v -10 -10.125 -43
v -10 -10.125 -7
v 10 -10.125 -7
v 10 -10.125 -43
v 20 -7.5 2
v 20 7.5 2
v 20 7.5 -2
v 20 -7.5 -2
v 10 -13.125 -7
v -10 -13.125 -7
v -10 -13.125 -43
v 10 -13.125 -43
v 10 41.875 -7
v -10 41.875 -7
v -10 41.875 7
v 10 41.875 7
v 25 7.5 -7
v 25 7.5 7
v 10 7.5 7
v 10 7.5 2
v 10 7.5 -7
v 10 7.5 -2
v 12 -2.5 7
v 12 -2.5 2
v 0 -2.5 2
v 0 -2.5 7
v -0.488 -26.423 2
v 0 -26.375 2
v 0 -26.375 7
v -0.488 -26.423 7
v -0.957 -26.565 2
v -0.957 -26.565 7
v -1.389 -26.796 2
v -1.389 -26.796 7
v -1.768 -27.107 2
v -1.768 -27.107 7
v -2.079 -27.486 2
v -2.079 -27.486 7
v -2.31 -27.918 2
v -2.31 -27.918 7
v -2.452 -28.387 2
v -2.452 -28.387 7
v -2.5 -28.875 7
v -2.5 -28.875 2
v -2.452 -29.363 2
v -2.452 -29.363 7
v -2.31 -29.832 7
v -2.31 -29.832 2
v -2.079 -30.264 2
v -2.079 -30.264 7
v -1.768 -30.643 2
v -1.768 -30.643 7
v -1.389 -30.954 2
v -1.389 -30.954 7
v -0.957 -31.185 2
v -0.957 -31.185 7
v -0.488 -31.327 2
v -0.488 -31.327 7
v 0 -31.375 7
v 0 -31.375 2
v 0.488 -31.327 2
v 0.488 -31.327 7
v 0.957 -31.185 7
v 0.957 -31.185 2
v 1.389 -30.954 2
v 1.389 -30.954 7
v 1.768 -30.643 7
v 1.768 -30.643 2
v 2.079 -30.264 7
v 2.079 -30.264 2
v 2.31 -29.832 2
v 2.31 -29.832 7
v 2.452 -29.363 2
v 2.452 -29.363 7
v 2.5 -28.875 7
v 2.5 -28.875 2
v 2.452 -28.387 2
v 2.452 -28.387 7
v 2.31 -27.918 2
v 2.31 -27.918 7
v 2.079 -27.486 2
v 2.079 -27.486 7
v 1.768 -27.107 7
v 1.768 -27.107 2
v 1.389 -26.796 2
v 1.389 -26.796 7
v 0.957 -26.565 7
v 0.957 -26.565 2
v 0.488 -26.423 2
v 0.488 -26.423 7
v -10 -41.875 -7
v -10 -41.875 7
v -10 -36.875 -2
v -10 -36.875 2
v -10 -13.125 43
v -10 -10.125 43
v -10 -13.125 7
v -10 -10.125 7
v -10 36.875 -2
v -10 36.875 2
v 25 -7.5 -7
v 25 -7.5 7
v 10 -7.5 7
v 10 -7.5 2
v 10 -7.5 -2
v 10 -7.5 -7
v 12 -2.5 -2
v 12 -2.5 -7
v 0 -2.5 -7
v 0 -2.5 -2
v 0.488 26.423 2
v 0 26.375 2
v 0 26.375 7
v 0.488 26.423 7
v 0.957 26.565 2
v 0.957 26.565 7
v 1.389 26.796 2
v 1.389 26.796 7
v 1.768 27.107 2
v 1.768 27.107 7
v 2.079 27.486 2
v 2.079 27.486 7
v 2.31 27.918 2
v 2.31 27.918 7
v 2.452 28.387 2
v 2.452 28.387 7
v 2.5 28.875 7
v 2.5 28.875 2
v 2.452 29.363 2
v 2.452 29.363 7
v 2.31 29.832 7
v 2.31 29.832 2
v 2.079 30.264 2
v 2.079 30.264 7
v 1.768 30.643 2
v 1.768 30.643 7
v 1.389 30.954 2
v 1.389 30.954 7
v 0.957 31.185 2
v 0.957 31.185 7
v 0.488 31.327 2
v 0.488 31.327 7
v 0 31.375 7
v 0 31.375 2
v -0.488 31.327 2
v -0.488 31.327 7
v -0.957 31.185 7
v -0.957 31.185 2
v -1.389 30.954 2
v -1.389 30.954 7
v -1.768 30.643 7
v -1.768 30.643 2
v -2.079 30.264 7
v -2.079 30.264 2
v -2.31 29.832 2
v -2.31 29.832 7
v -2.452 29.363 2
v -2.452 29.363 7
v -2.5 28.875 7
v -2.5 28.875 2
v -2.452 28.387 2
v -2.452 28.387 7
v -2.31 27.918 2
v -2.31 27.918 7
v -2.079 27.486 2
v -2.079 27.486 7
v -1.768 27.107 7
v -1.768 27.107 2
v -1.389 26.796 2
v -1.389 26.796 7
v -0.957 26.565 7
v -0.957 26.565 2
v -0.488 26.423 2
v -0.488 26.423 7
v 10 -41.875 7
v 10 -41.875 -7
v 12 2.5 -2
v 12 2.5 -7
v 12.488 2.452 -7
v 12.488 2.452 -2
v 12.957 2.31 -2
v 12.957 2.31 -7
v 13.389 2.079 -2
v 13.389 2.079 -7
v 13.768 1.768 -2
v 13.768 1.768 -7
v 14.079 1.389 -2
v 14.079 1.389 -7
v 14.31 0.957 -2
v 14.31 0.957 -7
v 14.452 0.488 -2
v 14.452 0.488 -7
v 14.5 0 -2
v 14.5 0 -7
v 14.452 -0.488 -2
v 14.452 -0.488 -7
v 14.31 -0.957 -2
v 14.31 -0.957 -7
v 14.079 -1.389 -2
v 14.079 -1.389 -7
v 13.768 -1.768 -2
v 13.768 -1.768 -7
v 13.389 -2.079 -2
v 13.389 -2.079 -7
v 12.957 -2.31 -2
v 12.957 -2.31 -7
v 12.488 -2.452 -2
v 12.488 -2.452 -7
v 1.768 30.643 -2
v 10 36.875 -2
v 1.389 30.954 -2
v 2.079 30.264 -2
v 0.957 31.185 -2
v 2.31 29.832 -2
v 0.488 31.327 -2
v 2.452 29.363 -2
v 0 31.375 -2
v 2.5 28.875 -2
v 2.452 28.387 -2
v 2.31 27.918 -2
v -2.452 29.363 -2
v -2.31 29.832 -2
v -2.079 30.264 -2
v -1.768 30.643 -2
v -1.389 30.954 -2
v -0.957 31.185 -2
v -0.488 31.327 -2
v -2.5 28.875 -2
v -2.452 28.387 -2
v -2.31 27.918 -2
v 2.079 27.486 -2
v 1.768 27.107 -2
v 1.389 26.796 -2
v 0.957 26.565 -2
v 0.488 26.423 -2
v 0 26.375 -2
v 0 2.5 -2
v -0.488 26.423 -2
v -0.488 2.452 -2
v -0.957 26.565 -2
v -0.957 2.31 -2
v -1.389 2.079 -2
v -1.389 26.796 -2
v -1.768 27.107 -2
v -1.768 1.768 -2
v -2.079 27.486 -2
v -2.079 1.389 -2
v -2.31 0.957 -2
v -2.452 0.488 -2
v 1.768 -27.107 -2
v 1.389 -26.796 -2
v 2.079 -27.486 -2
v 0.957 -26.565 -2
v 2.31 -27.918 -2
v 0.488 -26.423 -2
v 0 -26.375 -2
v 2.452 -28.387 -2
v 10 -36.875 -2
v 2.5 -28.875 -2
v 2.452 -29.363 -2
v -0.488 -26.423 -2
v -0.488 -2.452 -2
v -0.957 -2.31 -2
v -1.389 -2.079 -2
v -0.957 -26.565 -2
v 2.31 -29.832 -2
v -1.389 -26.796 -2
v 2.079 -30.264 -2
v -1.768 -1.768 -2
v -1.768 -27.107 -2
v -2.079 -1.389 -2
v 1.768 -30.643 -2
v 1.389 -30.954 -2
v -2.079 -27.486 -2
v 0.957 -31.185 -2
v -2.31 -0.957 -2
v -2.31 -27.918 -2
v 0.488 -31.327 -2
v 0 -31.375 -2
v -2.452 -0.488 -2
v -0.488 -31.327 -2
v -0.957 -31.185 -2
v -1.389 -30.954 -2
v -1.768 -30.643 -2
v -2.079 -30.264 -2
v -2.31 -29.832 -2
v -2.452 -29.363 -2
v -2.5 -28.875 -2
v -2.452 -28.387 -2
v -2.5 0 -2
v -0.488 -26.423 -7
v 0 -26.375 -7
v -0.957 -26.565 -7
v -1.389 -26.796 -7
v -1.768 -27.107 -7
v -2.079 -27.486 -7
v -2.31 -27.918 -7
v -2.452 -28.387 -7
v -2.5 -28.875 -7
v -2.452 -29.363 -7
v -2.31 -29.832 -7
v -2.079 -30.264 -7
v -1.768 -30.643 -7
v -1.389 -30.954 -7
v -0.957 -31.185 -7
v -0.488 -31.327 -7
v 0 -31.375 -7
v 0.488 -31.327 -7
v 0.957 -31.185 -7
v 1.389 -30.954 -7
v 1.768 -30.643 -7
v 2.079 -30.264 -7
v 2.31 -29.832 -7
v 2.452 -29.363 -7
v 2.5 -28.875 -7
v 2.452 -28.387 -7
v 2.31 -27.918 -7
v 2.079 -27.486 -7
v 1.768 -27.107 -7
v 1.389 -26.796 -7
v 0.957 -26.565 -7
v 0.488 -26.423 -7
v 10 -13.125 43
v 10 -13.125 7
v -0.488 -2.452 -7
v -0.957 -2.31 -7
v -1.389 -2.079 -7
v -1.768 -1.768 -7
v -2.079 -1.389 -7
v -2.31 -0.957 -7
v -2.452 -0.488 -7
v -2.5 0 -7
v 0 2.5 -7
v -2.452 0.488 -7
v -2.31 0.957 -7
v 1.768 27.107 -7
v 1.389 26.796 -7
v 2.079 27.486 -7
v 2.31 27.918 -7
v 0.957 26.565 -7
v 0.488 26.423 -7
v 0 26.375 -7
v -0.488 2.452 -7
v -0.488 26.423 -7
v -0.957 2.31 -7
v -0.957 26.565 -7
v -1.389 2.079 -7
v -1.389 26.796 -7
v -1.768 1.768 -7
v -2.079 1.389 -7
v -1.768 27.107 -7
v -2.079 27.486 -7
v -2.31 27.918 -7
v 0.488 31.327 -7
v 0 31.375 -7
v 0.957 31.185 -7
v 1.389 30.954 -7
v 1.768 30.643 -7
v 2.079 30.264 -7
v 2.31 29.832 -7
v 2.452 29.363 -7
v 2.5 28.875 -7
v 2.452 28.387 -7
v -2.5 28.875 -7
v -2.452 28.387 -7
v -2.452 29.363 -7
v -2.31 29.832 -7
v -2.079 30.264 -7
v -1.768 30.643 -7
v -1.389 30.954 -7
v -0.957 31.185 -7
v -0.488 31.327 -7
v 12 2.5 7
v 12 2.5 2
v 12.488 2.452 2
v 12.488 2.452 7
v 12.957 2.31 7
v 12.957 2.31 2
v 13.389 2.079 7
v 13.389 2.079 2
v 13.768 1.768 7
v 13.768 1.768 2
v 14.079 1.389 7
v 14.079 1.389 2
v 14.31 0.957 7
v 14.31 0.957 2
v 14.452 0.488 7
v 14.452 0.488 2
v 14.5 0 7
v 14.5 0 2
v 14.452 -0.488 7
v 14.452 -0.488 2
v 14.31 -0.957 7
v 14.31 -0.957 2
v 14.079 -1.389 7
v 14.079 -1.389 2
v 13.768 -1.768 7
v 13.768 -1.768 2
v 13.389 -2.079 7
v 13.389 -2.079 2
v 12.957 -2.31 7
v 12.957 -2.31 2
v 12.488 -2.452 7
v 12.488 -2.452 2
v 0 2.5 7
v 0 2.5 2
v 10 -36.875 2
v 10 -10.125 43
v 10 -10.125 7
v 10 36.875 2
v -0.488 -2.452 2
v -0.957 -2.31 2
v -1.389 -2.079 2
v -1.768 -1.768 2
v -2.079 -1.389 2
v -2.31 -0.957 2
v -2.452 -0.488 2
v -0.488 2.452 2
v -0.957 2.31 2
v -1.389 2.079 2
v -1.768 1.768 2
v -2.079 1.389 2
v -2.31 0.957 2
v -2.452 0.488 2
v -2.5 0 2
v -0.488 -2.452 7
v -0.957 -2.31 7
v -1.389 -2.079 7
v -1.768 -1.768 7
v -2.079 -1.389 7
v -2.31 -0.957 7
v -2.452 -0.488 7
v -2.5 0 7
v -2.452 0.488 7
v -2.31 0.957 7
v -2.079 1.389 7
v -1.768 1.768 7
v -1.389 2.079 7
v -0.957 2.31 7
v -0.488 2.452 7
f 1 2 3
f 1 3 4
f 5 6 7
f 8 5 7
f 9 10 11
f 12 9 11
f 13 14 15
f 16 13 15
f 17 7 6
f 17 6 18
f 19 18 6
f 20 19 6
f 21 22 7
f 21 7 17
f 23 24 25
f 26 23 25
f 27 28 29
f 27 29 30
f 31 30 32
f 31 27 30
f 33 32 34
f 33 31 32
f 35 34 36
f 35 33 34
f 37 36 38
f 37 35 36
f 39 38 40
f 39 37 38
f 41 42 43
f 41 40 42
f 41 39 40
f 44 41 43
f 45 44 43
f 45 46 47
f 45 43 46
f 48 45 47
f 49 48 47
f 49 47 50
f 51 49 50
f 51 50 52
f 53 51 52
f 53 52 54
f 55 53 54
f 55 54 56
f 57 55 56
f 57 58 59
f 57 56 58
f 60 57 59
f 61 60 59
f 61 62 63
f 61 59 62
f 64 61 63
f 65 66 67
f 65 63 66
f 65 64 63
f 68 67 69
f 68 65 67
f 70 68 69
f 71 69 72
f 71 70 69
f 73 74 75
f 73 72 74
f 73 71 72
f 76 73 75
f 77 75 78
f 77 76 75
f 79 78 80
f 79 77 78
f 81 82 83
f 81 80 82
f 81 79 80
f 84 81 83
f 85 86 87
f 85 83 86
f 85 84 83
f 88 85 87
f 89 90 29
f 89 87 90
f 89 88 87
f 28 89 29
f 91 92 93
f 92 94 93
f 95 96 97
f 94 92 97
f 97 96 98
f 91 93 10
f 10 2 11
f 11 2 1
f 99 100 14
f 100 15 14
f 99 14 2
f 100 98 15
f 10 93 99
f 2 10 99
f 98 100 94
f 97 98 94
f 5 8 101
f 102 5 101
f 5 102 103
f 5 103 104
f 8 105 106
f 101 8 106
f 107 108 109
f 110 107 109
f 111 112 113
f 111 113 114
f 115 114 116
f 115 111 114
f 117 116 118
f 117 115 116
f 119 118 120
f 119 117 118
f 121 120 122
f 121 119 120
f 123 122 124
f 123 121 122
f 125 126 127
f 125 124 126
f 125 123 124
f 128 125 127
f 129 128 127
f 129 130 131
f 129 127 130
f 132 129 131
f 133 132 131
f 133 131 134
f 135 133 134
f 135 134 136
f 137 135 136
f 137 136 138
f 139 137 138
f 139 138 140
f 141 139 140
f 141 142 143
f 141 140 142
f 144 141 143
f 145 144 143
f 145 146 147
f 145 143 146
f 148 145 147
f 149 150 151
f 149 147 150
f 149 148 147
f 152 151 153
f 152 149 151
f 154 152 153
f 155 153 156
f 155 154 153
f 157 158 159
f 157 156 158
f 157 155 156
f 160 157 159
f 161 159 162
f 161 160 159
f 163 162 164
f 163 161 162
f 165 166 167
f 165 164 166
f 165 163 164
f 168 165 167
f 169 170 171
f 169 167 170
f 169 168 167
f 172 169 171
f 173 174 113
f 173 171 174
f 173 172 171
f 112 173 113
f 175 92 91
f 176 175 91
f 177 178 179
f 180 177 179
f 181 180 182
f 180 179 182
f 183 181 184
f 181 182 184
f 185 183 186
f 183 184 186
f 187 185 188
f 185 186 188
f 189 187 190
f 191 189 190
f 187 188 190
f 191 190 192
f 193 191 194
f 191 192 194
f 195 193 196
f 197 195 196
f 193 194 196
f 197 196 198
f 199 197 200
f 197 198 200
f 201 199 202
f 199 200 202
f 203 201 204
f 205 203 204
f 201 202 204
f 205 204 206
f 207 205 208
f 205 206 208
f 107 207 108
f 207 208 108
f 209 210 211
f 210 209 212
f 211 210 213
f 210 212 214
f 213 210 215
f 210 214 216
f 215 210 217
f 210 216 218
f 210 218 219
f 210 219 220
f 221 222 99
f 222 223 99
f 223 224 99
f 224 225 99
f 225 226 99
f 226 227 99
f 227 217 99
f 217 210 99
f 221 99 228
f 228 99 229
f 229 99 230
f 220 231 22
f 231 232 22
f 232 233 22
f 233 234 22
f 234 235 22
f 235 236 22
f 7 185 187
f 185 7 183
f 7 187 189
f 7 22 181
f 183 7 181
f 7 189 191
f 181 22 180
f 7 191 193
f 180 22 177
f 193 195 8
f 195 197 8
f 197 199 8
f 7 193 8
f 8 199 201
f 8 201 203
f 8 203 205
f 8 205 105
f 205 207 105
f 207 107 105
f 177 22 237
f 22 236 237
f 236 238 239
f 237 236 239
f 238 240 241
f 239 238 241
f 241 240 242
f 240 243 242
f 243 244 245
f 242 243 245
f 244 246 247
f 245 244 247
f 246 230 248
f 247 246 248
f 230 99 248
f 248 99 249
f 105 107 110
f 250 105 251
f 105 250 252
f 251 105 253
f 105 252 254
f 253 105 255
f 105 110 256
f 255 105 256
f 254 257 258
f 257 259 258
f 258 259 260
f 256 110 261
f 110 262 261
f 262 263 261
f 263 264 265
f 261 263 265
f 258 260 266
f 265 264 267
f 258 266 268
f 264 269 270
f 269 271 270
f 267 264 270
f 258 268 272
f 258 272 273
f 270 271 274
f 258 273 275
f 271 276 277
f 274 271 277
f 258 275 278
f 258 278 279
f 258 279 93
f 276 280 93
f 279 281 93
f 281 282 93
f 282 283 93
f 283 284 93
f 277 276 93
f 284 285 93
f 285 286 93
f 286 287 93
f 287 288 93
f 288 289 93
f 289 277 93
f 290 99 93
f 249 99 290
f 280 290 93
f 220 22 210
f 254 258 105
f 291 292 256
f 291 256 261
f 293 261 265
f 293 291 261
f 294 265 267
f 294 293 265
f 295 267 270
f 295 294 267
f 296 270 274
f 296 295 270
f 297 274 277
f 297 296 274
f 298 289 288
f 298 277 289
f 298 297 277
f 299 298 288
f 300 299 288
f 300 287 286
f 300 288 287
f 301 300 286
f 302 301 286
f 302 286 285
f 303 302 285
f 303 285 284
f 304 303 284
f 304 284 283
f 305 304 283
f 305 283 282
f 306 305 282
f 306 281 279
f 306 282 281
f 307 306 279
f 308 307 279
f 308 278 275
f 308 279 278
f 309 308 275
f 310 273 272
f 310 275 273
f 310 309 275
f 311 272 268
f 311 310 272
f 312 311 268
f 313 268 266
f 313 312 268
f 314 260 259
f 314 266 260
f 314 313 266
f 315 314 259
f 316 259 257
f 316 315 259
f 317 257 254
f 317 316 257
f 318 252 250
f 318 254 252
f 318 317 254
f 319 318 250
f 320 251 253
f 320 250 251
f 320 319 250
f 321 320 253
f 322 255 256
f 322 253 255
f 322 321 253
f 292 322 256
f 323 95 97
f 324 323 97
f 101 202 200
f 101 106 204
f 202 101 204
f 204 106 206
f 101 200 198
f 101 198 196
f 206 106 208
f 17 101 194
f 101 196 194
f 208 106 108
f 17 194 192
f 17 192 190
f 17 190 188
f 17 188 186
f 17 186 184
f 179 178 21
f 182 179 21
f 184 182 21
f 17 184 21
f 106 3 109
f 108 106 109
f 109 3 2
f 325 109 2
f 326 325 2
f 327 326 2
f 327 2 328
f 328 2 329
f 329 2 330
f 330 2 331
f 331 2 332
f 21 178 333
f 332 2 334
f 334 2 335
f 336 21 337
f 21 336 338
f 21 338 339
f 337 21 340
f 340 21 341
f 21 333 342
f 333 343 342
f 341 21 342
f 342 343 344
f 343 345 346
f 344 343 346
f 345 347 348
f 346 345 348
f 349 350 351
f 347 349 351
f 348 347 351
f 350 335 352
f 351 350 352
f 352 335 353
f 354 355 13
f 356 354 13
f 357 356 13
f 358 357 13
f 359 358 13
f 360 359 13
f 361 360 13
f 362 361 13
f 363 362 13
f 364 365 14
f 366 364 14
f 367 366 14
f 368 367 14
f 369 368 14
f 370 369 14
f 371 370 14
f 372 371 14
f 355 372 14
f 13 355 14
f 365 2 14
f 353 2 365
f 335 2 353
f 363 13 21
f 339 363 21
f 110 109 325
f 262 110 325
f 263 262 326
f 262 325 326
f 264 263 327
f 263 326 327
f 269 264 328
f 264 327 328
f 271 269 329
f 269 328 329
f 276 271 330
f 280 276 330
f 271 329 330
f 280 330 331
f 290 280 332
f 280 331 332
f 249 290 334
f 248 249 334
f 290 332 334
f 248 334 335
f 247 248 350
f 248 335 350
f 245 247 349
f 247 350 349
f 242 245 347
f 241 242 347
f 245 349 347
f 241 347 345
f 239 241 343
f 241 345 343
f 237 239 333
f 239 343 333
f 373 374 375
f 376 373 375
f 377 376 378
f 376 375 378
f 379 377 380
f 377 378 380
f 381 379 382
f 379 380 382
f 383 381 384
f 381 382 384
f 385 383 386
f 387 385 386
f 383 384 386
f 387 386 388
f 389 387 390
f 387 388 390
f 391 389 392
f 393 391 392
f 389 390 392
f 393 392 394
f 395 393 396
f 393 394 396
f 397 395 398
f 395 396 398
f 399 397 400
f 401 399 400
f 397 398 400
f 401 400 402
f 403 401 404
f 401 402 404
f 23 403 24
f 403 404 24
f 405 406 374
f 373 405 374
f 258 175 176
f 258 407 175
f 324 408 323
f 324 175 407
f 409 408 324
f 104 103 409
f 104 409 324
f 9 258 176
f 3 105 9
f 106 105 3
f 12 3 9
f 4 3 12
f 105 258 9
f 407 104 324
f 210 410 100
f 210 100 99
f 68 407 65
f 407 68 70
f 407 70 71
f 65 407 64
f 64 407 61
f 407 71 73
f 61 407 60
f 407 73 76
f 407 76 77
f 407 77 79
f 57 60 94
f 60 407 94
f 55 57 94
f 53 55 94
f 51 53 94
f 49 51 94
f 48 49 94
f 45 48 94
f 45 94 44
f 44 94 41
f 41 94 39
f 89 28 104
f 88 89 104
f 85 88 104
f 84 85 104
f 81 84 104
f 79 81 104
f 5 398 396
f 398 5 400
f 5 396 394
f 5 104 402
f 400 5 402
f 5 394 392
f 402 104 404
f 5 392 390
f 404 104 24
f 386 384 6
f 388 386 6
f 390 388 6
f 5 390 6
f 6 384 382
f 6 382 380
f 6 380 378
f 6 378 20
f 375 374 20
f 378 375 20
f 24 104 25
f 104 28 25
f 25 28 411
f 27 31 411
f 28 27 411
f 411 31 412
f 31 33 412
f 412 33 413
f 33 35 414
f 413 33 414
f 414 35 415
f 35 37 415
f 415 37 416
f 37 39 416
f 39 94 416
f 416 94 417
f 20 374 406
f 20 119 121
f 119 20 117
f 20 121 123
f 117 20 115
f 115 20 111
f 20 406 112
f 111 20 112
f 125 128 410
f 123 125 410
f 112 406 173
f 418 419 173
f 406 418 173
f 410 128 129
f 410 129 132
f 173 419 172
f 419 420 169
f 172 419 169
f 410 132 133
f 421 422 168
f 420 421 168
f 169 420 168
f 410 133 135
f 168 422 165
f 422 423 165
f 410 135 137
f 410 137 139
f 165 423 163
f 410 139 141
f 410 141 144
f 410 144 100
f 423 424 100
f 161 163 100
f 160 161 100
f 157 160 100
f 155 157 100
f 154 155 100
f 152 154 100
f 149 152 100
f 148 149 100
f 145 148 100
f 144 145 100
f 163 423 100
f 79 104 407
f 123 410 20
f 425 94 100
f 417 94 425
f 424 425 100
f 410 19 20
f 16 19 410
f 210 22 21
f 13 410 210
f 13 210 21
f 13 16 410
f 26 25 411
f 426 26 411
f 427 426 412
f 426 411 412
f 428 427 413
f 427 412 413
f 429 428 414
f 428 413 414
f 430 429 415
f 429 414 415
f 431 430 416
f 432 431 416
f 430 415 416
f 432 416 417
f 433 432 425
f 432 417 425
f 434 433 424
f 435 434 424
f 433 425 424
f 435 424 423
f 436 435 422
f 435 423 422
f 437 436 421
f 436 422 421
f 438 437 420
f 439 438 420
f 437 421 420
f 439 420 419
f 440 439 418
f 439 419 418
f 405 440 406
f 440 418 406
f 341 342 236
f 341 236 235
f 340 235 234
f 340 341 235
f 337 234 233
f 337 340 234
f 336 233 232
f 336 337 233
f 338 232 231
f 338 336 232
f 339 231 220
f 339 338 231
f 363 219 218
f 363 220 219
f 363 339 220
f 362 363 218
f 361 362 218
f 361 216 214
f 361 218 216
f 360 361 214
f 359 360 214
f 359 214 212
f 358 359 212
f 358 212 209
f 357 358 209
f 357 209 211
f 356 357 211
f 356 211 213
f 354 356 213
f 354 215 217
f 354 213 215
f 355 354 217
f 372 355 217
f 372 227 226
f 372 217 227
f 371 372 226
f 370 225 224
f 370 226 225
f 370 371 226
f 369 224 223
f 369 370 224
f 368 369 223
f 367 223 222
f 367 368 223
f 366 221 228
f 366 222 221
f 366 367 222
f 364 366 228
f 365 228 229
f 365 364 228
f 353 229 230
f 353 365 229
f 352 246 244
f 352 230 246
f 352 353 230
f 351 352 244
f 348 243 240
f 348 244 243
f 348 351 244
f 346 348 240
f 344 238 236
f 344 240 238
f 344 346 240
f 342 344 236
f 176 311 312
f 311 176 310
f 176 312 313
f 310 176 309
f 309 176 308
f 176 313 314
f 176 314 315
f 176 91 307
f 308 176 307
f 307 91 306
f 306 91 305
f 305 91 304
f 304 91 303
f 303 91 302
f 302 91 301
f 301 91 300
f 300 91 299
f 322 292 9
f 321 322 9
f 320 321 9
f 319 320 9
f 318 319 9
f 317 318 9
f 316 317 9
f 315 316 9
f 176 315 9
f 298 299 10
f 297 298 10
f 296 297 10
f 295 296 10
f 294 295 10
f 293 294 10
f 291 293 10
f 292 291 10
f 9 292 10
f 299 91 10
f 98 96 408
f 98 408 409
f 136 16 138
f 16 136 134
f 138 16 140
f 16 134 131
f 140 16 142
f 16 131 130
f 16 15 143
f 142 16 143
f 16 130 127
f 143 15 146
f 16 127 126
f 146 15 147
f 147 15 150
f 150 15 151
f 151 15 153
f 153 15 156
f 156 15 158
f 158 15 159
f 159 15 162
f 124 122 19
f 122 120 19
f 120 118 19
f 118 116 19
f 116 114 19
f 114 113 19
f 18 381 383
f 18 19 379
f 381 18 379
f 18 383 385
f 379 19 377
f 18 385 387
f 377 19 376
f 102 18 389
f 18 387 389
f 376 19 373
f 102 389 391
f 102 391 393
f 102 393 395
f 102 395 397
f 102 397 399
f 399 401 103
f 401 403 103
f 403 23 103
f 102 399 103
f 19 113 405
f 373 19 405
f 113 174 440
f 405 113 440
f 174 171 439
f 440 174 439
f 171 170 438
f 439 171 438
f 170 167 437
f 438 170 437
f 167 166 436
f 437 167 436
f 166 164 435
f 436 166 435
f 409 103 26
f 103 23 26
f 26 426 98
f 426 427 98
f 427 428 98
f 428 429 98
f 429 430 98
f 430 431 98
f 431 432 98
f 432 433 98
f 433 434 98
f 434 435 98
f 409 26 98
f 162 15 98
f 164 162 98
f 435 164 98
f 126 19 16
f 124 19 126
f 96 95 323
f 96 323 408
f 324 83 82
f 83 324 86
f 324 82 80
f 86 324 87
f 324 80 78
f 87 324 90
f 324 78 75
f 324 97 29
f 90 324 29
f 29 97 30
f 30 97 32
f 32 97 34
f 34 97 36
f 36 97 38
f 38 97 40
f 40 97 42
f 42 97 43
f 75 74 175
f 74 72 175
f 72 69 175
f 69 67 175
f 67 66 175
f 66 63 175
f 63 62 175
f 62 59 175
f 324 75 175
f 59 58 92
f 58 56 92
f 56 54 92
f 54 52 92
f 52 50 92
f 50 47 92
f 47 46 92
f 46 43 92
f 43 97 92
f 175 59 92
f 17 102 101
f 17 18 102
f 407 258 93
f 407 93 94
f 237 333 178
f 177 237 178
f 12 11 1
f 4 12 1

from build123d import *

# Parameters (mm, degrees)
BOSS_EXTRUDE5_DEPTH      = 10
BOSS_EXTRUDE5_DEPTH_BACK = 10
BOSS_EXTRUDE6_DEPTH      = 25
BOSS_EXTRUDE6_DEPTH_BACK = 10
SKETCH1_8_W              = 5
SKETCH1_8_H              = 15
BOSS_EXTRUDE7_START      = 20
SKETCH1_9_W              = 4
SKETCH1_9_H              = 15
BOSS_EXTRUDE7_DEPTH      = 5
BOSS_EXTRUDE8_DEPTH      = 10
BOSS_EXTRUDE8_DEPTH_BACK = 10
BOSS_EXTRUDE9_DEPTH      = 10
BOSS_EXTRUDE9_DEPTH_BACK = 10
SKETCH1_11_W             = 36
SKETCH1_11_H             = 3
CUT_EXTRUDE2_DEPTH       = 70.846371595
CUT_EXTRUDE2_DEPTH_BACK  = 70.846371595
SKETCH2_R                = 2.5


with BuildPart() as part:
    # Sketch1 → Boss-Extrude5 (new, two sides: drawn at the far end of the back side and taken through both)
    with BuildSketch(Plane(origin=(0, 0, 0), x_dir=(0, 0, -1), z_dir=(1, 0, 0)).offset(-BOSS_EXTRUDE5_DEPTH_BACK)):
        Polygon((-7, 41.875), (-7, 7.5), (-2, 7.5), (-2, 36.875), (2, 36.875), (2, 7.5), (7, 7.5), (7, 41.875), align=None)
    extrude(amount=BOSS_EXTRUDE5_DEPTH + BOSS_EXTRUDE5_DEPTH_BACK)

    # Sketch1<8> → Boss-Extrude6 (add, two sides: drawn at the far end of the back side and taken through both)
    with BuildSketch(Plane(origin=(0, 0, 0), x_dir=(0, 0, -1), z_dir=(1, 0, 0)).offset(-BOSS_EXTRUDE6_DEPTH_BACK)):
        with Locations((-4.5, 0)):
            Rectangle(SKETCH1_8_W, SKETCH1_8_H)
        with Locations((4.5, 0)):
            Rectangle(SKETCH1_8_W, SKETCH1_8_H)
    extrude(amount=BOSS_EXTRUDE6_DEPTH + BOSS_EXTRUDE6_DEPTH_BACK)

    # Sketch1<9> → Boss-Extrude7 (add)
    with BuildSketch(Plane(origin=(0, 0, 0), x_dir=(0, 0, -1), z_dir=(1, 0, 0)).offset(BOSS_EXTRUDE7_START)):
        Rectangle(SKETCH1_9_W, SKETCH1_9_H)
    extrude(amount=BOSS_EXTRUDE7_DEPTH)

    # Sketch1<10> → Boss-Extrude8 (add, two sides: drawn at the far end of the back side and taken through both)
    with BuildSketch(Plane(origin=(0, 0, 0), x_dir=(0, 0, -1), z_dir=(1, 0, 0)).offset(-BOSS_EXTRUDE8_DEPTH_BACK)):
        Polygon((-2, -7.5), (-7, -7.5), (-7, -10.125), (-7, -13.125), (-7, -41.875), (7, -41.875), (7, -13.125), (7, -10.125), (7, -7.5), (2, -7.5), (2, -36.875), (-2, -36.875), align=None)
    extrude(amount=BOSS_EXTRUDE8_DEPTH + BOSS_EXTRUDE8_DEPTH_BACK)

    # Sketch1<11> → Boss-Extrude9 (add, two sides: drawn at the far end of the back side and taken through both)
    with BuildSketch(Plane(origin=(0, 0, 0), x_dir=(0, 0, -1), z_dir=(1, 0, 0)).offset(-BOSS_EXTRUDE9_DEPTH_BACK)):
        with Locations((-25, -11.625)):
            Rectangle(SKETCH1_11_W, SKETCH1_11_H)
        with Locations((25, -11.625)):
            Rectangle(SKETCH1_11_W, SKETCH1_11_H)
    extrude(amount=BOSS_EXTRUDE9_DEPTH + BOSS_EXTRUDE9_DEPTH_BACK)

    # Sketch2 → Cut-Extrude2 (cut, two sides: drawn at the far end of the back side and taken through both)
    with BuildSketch(Plane.XY.offset(7).offset(-CUT_EXTRUDE2_DEPTH_BACK)):
        with Locations((0, 28.875)):
            Circle(SKETCH2_R)
        with Locations((0, -28.875)):
            Circle(SKETCH2_R)
        with BuildLine():
            Line((0, 2.5), (12, 2.5))
            ThreePointArc((12, 2.5), (14.5, 0), (12, -2.5))
            Line((12, -2.5), (0, -2.5))
            ThreePointArc((0, -2.5), (-2.5, 0), (0, 2.5))
        make_face()
    extrude(amount=CUT_EXTRUDE2_DEPTH + CUT_EXTRUDE2_DEPTH_BACK, mode=Mode.SUBTRACT)


solid = part.part
